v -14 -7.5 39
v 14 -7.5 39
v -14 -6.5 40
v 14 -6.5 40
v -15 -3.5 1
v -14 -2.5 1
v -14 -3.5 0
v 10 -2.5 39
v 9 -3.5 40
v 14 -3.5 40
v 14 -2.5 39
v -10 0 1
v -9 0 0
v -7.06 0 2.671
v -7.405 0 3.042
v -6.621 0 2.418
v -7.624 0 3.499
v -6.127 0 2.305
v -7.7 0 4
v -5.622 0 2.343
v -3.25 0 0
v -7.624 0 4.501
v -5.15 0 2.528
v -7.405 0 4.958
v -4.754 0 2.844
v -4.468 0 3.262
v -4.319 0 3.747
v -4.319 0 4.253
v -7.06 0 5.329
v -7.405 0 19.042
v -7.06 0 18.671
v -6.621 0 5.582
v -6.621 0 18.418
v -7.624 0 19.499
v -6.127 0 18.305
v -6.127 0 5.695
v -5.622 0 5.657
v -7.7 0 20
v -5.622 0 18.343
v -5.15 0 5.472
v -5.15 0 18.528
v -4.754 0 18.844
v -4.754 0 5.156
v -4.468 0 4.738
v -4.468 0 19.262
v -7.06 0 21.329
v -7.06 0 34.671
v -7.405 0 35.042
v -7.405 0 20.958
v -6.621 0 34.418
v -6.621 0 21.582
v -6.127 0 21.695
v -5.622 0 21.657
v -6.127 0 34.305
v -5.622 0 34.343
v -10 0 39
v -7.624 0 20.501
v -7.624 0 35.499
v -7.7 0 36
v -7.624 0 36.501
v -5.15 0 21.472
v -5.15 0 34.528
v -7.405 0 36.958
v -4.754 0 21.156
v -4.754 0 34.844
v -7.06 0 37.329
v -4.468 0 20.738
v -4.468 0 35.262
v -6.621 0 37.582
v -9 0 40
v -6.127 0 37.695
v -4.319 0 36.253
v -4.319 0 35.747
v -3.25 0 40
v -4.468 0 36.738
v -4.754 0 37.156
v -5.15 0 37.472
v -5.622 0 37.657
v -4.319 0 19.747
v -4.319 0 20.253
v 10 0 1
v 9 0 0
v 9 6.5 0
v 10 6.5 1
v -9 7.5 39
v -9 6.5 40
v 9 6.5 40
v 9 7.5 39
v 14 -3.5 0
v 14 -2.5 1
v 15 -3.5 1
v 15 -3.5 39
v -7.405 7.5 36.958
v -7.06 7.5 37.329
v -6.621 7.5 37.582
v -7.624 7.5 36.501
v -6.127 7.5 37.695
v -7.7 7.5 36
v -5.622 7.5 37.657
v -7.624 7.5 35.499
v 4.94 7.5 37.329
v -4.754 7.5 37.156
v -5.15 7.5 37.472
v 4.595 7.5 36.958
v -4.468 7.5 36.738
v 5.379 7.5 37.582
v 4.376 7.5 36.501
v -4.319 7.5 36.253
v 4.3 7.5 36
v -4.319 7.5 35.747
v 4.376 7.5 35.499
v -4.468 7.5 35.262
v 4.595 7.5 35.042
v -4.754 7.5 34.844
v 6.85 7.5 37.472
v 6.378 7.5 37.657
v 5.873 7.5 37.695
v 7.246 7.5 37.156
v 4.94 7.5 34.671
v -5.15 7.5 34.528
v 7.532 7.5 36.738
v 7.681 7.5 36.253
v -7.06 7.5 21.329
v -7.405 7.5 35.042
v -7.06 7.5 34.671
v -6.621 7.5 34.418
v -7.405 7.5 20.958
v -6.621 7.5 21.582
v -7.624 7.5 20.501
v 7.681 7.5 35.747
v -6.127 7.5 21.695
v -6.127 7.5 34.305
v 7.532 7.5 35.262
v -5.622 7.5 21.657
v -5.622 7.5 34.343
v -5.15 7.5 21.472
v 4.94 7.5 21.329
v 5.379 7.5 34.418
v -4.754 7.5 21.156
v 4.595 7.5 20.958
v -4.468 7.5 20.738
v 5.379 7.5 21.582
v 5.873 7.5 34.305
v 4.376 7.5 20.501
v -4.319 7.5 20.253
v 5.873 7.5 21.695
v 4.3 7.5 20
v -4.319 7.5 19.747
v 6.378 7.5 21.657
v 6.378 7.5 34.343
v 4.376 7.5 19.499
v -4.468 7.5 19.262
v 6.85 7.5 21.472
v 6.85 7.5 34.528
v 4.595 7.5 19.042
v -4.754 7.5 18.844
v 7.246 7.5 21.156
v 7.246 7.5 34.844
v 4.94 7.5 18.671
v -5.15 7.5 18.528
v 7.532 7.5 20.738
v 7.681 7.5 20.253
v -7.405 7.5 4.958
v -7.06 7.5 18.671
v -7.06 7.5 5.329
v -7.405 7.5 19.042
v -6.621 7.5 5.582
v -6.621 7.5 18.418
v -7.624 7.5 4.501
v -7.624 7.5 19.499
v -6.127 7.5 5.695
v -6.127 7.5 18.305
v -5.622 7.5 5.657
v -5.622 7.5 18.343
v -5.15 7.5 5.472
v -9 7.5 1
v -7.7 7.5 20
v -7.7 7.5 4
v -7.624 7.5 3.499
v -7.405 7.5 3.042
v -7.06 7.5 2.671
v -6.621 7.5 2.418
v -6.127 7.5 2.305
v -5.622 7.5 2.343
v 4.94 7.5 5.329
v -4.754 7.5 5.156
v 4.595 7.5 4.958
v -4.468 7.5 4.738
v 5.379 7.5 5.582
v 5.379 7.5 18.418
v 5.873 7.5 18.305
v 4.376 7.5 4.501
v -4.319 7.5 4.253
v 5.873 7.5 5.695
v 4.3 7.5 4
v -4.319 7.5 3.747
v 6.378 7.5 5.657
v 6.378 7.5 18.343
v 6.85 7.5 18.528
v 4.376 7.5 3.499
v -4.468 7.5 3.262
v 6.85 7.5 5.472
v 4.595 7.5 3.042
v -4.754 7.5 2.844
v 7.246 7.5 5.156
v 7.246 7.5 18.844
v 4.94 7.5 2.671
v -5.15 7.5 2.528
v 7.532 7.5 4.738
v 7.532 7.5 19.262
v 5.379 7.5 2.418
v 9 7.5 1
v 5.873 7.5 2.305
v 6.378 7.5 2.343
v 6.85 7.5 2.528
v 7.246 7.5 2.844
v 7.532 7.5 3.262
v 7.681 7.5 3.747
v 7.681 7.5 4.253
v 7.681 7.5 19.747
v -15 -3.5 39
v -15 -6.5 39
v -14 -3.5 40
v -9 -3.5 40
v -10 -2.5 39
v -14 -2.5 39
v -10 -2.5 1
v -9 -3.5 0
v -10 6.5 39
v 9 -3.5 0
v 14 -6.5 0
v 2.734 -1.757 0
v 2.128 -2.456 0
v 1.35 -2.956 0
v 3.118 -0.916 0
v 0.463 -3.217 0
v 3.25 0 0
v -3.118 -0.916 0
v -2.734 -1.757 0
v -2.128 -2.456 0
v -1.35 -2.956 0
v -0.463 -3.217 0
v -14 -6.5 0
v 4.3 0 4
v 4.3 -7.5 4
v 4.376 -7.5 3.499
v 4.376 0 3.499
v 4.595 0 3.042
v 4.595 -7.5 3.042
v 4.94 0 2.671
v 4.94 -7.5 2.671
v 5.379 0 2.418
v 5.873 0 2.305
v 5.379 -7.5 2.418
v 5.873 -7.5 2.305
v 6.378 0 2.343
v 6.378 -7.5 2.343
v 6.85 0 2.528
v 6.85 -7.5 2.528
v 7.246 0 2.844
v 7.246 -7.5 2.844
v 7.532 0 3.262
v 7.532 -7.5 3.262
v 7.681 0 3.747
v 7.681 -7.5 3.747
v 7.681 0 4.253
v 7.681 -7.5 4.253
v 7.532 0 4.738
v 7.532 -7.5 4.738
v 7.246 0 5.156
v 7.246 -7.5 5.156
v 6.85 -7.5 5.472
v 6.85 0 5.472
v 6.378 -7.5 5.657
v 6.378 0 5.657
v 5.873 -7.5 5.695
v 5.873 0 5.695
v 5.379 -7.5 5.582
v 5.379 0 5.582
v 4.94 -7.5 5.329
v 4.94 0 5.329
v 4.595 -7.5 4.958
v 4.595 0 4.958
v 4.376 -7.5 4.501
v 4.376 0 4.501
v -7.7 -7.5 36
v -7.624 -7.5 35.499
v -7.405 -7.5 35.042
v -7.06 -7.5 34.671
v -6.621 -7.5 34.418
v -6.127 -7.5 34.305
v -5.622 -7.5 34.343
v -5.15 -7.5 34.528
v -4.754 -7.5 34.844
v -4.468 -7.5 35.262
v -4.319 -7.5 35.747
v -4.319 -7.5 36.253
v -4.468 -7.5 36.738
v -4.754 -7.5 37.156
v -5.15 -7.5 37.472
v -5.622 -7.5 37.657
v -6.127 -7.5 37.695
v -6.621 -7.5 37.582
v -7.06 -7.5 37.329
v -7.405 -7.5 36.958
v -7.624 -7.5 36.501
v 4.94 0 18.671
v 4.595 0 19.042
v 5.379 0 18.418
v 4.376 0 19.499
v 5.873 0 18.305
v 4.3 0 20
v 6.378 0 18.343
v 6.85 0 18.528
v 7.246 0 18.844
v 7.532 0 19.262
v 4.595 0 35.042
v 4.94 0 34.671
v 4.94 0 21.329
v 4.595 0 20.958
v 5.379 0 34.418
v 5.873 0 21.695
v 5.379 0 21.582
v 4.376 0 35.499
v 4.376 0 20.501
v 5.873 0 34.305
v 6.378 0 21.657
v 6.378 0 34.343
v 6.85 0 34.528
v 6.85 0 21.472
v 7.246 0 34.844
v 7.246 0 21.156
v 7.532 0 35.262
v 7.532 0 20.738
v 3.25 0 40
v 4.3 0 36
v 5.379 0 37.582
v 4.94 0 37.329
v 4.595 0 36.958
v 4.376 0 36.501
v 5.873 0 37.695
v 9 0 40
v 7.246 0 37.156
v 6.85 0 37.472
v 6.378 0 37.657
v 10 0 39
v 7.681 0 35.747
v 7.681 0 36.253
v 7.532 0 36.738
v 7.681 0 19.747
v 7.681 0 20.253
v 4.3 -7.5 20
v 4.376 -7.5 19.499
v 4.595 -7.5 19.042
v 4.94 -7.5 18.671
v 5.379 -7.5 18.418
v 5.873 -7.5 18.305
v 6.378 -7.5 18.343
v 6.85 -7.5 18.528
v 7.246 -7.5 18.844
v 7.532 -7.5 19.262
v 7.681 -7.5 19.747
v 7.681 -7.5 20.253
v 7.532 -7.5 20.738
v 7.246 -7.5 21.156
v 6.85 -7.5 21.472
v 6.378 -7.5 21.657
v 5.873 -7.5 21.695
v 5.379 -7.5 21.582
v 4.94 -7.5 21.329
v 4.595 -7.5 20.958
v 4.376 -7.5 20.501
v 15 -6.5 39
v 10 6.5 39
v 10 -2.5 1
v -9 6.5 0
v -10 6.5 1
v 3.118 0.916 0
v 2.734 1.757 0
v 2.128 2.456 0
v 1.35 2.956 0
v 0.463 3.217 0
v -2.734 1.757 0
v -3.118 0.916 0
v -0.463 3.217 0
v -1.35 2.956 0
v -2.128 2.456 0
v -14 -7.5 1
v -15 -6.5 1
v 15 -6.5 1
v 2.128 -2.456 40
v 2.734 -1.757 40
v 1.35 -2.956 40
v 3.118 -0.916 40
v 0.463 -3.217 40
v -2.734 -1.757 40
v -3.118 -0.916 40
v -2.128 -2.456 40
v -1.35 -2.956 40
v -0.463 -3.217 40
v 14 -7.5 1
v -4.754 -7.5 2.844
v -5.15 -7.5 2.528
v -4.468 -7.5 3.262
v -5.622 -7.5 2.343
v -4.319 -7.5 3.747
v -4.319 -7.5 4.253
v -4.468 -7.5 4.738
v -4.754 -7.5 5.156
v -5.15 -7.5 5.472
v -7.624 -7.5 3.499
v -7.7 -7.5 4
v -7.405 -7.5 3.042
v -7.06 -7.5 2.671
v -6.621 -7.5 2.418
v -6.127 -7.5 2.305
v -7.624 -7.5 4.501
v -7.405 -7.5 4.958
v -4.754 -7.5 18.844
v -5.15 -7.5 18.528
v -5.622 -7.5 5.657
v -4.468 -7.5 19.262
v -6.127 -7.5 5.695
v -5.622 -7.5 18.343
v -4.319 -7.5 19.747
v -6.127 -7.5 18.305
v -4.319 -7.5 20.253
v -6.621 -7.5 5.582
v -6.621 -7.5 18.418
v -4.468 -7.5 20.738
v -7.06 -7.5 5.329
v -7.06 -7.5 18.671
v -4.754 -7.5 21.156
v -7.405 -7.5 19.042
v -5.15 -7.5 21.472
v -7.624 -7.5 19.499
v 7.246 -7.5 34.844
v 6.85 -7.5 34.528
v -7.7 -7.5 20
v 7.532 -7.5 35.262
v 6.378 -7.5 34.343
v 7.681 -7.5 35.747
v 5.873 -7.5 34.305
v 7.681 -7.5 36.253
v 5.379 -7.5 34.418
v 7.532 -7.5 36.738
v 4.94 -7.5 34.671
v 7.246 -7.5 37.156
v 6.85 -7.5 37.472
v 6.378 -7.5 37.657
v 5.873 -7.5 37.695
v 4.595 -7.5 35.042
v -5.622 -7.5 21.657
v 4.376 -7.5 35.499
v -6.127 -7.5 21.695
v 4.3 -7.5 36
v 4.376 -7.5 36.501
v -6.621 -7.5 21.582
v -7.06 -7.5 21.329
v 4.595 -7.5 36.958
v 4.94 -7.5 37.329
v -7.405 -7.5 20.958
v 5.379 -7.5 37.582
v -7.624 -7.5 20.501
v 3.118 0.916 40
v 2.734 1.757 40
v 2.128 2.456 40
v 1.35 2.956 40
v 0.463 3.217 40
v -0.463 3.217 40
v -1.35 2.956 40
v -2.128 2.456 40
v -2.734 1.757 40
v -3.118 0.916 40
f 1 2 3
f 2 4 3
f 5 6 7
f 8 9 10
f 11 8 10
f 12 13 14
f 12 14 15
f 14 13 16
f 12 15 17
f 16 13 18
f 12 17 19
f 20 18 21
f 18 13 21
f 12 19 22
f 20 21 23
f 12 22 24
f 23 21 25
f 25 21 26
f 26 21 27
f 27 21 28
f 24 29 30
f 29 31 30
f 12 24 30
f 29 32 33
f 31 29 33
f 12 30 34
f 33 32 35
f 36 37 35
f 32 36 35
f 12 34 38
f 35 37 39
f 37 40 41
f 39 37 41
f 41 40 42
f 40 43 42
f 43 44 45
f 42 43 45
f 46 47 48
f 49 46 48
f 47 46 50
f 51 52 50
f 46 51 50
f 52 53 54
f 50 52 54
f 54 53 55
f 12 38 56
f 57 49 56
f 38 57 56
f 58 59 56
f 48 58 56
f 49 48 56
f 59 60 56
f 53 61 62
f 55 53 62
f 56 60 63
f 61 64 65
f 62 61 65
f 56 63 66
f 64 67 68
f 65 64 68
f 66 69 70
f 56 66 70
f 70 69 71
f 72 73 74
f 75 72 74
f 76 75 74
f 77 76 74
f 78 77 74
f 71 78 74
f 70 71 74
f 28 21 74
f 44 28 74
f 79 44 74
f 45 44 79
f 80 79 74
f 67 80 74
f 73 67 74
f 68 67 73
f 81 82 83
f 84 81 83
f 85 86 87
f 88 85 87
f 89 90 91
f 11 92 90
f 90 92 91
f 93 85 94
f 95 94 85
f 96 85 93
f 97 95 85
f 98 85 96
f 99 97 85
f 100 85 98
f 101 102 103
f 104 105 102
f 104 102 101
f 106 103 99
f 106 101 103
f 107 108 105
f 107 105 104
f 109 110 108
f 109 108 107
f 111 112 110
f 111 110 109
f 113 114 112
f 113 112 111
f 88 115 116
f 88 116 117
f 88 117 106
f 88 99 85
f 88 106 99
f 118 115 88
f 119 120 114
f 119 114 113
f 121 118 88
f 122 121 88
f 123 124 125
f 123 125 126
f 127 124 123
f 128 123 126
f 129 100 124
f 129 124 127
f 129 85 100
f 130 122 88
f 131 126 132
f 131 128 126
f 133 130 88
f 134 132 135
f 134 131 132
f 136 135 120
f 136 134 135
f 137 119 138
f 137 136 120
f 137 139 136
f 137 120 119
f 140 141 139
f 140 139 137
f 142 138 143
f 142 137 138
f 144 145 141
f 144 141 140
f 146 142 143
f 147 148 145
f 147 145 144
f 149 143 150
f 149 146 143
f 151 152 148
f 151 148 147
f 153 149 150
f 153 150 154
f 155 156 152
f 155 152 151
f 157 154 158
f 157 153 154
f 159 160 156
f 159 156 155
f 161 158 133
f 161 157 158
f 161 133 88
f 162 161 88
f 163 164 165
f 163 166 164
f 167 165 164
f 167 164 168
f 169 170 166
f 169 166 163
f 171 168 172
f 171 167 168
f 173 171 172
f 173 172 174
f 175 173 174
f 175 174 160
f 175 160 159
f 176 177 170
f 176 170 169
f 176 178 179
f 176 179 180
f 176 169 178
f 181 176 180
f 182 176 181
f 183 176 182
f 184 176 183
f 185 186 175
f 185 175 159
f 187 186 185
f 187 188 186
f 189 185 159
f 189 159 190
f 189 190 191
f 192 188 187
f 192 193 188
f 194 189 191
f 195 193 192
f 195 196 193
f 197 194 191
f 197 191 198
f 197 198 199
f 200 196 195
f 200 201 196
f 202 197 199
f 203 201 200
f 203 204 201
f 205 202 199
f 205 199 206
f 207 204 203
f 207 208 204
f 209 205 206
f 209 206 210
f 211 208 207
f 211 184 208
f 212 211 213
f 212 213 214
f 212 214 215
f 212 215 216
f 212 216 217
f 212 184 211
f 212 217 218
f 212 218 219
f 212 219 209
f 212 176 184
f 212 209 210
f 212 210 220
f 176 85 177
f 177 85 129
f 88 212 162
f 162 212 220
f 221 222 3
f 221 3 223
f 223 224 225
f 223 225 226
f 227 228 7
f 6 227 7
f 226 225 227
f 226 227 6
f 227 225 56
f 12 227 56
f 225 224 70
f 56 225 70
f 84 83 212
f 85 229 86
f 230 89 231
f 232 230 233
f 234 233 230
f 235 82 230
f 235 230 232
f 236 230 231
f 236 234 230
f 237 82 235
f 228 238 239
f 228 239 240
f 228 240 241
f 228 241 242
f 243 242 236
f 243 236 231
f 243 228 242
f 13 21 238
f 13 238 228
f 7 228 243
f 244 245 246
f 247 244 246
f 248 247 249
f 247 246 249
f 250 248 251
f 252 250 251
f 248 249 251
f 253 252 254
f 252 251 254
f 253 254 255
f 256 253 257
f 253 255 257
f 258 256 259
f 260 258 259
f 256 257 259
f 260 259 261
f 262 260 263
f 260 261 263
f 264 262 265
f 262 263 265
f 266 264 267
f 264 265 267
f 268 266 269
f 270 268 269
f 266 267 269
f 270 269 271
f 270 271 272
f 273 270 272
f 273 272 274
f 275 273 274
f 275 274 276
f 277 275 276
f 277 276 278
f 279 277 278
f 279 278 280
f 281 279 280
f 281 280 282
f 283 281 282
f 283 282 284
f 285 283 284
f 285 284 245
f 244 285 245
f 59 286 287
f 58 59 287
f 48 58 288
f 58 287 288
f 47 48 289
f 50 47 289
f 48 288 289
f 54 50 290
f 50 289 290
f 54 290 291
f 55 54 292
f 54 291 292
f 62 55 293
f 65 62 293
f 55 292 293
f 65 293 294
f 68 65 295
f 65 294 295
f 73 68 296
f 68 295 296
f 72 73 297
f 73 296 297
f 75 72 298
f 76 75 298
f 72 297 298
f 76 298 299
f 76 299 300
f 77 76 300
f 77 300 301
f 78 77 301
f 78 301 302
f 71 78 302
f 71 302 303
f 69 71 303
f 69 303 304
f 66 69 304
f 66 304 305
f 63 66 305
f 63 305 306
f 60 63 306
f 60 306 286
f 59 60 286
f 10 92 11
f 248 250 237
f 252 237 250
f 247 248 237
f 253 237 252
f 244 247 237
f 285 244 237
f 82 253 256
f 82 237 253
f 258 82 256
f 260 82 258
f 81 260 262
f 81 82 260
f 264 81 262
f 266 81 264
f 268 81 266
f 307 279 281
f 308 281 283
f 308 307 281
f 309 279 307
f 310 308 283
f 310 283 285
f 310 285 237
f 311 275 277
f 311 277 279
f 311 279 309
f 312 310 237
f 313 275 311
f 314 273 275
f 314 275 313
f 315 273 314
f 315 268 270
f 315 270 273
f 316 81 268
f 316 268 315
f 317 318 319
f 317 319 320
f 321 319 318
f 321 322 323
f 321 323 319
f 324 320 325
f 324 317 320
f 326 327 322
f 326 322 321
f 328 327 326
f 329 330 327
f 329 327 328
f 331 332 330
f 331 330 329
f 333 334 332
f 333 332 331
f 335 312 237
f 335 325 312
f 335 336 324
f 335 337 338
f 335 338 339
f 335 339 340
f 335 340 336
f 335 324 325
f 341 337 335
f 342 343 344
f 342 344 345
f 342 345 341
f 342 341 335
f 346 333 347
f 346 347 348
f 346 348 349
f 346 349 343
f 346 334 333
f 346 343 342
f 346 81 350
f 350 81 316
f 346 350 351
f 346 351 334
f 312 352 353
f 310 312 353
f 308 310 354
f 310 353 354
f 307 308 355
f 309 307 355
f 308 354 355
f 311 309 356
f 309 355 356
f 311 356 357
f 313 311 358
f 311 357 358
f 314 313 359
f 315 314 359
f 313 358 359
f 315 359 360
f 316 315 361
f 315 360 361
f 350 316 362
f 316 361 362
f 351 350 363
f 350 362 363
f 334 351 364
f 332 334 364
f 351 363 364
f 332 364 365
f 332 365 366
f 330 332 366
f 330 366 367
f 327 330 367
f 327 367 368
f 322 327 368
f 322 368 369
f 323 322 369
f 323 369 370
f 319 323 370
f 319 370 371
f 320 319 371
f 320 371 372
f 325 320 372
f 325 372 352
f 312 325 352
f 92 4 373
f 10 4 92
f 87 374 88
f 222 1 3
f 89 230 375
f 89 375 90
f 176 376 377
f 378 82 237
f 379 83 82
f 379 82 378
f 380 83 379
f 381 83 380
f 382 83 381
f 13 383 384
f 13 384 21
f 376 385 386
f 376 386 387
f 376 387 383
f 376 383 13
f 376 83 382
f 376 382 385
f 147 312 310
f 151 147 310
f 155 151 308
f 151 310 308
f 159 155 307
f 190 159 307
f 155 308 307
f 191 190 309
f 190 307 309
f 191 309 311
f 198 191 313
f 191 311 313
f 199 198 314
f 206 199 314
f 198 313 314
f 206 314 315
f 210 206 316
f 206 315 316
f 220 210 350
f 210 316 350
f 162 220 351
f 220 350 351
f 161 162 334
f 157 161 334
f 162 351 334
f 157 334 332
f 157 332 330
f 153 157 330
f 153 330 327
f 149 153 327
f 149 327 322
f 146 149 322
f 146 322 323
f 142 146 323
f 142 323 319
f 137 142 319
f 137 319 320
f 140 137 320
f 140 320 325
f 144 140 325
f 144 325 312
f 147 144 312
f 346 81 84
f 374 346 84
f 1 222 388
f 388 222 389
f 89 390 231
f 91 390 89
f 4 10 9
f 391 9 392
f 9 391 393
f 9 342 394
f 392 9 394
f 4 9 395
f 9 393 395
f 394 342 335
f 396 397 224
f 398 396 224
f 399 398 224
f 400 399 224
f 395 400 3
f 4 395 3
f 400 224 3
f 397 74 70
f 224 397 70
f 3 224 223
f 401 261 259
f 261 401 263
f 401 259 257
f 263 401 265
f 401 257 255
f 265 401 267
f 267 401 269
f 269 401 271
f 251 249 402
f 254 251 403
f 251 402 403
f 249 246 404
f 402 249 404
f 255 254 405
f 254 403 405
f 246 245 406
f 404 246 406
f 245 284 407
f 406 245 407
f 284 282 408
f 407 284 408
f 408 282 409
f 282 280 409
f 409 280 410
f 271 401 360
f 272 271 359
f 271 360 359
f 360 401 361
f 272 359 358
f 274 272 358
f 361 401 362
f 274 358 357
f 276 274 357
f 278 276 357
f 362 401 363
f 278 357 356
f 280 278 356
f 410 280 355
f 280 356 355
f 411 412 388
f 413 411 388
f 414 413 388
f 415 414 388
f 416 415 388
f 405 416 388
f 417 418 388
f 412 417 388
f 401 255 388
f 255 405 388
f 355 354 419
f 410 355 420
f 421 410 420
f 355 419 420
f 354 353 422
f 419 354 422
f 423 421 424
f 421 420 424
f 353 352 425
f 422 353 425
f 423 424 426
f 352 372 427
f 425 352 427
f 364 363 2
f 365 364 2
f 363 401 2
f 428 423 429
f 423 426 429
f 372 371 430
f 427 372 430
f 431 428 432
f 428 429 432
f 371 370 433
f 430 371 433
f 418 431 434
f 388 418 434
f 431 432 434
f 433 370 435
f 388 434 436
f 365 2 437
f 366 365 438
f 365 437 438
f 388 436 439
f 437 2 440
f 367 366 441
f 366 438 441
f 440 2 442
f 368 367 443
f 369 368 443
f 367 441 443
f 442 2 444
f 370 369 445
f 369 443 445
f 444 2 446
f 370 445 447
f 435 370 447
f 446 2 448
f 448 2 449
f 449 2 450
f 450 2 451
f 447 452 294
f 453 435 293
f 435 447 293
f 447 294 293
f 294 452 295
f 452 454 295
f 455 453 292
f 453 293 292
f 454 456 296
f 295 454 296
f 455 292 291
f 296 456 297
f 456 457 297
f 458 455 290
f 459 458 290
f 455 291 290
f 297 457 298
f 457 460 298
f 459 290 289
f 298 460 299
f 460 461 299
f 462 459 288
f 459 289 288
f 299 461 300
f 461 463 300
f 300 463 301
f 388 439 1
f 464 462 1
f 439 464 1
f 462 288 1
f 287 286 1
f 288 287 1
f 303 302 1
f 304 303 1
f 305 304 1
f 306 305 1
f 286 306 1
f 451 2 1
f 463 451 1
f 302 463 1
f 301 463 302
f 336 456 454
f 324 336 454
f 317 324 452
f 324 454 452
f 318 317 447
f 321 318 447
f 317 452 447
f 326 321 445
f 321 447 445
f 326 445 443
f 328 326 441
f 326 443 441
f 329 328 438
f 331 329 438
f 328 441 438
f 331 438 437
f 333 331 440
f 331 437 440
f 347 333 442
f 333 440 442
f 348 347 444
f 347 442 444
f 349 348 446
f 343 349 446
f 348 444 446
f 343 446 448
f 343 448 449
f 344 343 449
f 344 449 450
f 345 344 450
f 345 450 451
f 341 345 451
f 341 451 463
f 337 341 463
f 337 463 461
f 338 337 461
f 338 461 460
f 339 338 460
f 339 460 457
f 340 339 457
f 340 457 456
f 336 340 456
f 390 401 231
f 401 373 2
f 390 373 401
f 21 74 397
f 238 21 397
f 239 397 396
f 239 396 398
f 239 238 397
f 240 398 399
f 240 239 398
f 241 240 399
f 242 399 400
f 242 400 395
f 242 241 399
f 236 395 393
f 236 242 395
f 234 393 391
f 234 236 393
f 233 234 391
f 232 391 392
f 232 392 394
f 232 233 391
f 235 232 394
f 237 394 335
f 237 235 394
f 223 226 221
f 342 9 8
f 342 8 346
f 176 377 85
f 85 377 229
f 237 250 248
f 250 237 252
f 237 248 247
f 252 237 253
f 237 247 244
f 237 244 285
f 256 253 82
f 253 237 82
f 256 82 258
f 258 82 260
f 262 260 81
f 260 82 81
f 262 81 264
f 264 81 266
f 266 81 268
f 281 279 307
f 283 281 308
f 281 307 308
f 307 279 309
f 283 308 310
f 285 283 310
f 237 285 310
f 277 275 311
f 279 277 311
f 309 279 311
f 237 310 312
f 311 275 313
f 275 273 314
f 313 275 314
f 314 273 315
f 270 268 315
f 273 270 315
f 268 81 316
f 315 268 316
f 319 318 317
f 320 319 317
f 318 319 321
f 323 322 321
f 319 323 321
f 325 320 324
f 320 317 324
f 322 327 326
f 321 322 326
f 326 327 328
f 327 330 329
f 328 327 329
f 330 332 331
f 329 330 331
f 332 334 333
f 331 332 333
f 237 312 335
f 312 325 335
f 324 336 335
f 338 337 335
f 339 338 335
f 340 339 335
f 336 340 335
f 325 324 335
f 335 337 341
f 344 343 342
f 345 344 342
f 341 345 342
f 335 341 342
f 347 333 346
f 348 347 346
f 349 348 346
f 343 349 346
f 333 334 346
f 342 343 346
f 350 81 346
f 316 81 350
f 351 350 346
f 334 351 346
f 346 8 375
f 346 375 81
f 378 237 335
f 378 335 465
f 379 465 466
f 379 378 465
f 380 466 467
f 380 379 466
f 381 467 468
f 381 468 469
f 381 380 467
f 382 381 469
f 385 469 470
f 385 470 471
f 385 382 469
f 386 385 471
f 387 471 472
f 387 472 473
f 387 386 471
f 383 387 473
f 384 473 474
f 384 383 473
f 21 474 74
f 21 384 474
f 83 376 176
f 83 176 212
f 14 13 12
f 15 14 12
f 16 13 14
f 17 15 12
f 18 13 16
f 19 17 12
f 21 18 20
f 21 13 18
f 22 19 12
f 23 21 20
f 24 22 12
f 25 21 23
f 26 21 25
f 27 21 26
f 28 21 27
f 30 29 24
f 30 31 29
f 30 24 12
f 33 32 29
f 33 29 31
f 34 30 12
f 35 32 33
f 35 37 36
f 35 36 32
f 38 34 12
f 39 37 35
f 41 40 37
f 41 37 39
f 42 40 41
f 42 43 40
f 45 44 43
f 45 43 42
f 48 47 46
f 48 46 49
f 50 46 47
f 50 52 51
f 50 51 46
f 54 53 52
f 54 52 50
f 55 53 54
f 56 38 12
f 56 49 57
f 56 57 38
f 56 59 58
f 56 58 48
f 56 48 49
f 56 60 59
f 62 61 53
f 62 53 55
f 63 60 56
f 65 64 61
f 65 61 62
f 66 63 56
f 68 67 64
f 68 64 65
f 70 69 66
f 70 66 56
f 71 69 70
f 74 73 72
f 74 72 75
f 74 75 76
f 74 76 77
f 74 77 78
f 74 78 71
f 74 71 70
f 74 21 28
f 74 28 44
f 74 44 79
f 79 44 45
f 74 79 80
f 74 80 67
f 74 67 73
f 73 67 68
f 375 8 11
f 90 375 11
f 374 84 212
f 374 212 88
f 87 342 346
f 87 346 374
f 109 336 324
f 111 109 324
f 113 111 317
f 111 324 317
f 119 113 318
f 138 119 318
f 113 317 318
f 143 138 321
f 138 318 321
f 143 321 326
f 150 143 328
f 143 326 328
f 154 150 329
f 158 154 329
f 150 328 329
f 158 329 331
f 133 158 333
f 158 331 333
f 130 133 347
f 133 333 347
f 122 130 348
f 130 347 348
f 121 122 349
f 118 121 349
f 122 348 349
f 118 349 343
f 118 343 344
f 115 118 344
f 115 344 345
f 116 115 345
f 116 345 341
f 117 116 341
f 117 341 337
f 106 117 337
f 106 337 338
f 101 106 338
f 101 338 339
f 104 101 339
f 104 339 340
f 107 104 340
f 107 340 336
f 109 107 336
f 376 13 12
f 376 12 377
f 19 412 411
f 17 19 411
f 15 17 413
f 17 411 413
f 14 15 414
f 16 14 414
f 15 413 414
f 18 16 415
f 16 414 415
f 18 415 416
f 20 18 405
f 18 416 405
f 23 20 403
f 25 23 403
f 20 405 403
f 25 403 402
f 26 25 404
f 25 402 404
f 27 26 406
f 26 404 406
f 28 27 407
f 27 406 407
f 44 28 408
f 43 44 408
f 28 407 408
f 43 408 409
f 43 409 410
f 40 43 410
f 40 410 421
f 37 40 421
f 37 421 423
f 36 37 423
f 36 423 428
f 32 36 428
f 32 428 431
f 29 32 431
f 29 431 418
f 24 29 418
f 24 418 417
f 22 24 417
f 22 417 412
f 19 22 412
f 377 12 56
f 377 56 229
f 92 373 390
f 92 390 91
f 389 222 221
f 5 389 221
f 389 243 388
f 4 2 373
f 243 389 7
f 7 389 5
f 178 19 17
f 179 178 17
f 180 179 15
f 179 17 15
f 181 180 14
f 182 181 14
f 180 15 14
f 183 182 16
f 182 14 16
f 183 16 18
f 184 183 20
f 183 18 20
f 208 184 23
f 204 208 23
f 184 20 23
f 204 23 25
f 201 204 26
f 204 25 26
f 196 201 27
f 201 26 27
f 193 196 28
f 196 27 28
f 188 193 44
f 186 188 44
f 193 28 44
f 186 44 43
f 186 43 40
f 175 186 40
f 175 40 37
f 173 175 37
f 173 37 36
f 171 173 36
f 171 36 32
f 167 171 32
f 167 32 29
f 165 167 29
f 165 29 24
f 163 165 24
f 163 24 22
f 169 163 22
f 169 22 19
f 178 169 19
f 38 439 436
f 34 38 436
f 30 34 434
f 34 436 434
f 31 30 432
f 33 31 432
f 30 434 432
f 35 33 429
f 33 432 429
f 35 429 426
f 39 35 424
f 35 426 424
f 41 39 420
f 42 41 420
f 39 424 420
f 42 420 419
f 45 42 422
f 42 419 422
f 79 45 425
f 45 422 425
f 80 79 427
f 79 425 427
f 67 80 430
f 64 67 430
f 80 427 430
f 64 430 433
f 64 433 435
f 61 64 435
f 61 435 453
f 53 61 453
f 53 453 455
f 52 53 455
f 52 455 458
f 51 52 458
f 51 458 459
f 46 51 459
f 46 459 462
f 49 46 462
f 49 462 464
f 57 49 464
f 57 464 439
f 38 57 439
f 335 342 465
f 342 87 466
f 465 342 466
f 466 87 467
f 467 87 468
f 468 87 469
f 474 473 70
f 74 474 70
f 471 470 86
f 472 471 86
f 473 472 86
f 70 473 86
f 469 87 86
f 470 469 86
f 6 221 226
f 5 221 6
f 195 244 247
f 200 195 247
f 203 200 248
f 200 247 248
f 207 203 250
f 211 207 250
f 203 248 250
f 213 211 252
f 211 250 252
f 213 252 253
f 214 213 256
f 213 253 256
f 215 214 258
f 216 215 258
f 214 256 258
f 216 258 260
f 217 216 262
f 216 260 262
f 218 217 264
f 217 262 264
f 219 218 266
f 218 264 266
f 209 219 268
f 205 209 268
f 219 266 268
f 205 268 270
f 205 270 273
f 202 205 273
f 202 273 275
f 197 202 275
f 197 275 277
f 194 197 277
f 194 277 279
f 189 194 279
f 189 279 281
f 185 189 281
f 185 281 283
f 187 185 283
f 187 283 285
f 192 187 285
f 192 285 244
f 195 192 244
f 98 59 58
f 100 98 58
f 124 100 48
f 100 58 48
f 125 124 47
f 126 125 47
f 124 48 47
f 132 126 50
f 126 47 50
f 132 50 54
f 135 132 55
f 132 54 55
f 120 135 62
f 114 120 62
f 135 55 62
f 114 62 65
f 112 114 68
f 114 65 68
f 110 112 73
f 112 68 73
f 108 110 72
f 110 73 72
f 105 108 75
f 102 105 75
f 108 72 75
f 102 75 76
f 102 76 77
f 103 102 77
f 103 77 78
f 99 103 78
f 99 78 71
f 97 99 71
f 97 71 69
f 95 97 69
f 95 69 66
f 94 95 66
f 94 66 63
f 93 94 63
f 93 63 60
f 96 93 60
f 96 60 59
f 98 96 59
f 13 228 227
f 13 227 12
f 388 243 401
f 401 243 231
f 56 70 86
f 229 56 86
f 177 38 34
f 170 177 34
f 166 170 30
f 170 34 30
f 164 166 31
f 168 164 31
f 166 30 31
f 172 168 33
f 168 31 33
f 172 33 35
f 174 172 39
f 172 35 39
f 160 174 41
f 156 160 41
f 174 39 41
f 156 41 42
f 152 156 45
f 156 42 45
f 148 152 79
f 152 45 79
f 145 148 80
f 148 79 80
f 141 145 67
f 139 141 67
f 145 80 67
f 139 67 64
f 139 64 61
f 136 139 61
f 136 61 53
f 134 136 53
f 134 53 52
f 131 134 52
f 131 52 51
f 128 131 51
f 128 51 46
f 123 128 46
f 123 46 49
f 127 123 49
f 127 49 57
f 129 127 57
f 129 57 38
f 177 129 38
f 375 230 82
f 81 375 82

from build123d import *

# Parameters (mm, degrees)
SKETCH1_W            = 20
SKETCH1_H            = 15
SKETCH1_R            = 3.25
BOSS_EXTRUDE1_DEPTH  = 40
M3_CLEARANCE_HOLE1_D = 3.4
LPATTERN1_COUNT      = 3
LPATTERN1_PITCH      = 16
LPATTERN1_COUNT_DIR2 = 2
LPATTERN1_PITCH_DIR2 = 12
SKETCH5_W            = 5
SKETCH5_H            = 5
BOSS_EXTRUDE3_DEPTH  = 40
CHAMFER1_SIZE        = 1


with BuildPart() as part:
    # Sketch1 → Boss-Extrude1 (new body)
    with BuildSketch(Plane.XY):
        Rectangle(SKETCH1_W, SKETCH1_H)
        Circle(SKETCH1_R, mode=Mode.SUBTRACT)
    extrude(amount=BOSS_EXTRUDE1_DEPTH)

    # M3 Clearance Hole1 (through all)
    with Locations(Plane(origin=(0, 7.5, 0), x_dir=(1, 0, 0), z_dir=(0, 1, 0))):
        with Locations((-6, -36)):
            m3_clearance_hole1 = Hole(M3_CLEARANCE_HOLE1_D / 2)

    # LPattern1: M3 Clearance Hole1 3 × 2
    with Locations(*[(j * LPATTERN1_PITCH_DIR2, 0, -i * LPATTERN1_PITCH) for i in range(LPATTERN1_COUNT) for j in range(LPATTERN1_COUNT_DIR2) if (i, j) != (0, 0)]):
        add(m3_clearance_hole1, mode=Mode.SUBTRACT)

    # Sketch5 → Boss-Extrude3 (add)
    with BuildSketch(Plane.XY.offset(40)):
        with Locations((12.5, -5)):
            Rectangle(SKETCH5_W, SKETCH5_H)
    boss_extrude3 = extrude(amount=-BOSS_EXTRUDE3_DEPTH)

    # Mirror2: Boss-Extrude3 across plane
    add(boss_extrude3.mirror(Plane(origin=(0, 0, 0), x_dir=(0, 0, 1), z_dir=(1, 0, 0))))

    # Chamfer1
    chamfer1_edges = [part.edges().sort_by_distance(p)[0] for p in [
        (-10, 2.5, 40),
        (0, -7.5, 40),
        (0, -7.5, 0),
        (10, 2.5, 0),
        (10, 2.5, 40),
        (15, -2.5, 20),
        (15, -7.5, 20),
        (15, -5, 40),
        (-10, 2.5, 0),
        (12.5, -2.5, 40),
        (12.5, -2.5, 0),
        (15, -5, 0),
        (0, 7.5, 0),
        (-12.5, -2.5, 0),
        (-15, -2.5, 20),
        (-12.5, -2.5, 40),
        (-15, -5, 0),
        (-15, -7.5, 20),
        (-15, -5, 40),
        (-10, 7.5, 20),
        (10, 7.5, 20),
        (0, 7.5, 40),
    ]]
    chamfer(chamfer1_edges, length=CHAMFER1_SIZE)


with BuildPart() as body_2:
    # Split1: the piece on the far side of the plane
    add(part.part)
    split(bisect_by=Plane.ZX, keep=Keep.BOTTOM)


with BuildPart() as part_1:
    add(part.part)

    # Split1
    split(bisect_by=Plane.ZX, keep=Keep.TOP)


solid = Compound([body_2.part, part_1.part])
